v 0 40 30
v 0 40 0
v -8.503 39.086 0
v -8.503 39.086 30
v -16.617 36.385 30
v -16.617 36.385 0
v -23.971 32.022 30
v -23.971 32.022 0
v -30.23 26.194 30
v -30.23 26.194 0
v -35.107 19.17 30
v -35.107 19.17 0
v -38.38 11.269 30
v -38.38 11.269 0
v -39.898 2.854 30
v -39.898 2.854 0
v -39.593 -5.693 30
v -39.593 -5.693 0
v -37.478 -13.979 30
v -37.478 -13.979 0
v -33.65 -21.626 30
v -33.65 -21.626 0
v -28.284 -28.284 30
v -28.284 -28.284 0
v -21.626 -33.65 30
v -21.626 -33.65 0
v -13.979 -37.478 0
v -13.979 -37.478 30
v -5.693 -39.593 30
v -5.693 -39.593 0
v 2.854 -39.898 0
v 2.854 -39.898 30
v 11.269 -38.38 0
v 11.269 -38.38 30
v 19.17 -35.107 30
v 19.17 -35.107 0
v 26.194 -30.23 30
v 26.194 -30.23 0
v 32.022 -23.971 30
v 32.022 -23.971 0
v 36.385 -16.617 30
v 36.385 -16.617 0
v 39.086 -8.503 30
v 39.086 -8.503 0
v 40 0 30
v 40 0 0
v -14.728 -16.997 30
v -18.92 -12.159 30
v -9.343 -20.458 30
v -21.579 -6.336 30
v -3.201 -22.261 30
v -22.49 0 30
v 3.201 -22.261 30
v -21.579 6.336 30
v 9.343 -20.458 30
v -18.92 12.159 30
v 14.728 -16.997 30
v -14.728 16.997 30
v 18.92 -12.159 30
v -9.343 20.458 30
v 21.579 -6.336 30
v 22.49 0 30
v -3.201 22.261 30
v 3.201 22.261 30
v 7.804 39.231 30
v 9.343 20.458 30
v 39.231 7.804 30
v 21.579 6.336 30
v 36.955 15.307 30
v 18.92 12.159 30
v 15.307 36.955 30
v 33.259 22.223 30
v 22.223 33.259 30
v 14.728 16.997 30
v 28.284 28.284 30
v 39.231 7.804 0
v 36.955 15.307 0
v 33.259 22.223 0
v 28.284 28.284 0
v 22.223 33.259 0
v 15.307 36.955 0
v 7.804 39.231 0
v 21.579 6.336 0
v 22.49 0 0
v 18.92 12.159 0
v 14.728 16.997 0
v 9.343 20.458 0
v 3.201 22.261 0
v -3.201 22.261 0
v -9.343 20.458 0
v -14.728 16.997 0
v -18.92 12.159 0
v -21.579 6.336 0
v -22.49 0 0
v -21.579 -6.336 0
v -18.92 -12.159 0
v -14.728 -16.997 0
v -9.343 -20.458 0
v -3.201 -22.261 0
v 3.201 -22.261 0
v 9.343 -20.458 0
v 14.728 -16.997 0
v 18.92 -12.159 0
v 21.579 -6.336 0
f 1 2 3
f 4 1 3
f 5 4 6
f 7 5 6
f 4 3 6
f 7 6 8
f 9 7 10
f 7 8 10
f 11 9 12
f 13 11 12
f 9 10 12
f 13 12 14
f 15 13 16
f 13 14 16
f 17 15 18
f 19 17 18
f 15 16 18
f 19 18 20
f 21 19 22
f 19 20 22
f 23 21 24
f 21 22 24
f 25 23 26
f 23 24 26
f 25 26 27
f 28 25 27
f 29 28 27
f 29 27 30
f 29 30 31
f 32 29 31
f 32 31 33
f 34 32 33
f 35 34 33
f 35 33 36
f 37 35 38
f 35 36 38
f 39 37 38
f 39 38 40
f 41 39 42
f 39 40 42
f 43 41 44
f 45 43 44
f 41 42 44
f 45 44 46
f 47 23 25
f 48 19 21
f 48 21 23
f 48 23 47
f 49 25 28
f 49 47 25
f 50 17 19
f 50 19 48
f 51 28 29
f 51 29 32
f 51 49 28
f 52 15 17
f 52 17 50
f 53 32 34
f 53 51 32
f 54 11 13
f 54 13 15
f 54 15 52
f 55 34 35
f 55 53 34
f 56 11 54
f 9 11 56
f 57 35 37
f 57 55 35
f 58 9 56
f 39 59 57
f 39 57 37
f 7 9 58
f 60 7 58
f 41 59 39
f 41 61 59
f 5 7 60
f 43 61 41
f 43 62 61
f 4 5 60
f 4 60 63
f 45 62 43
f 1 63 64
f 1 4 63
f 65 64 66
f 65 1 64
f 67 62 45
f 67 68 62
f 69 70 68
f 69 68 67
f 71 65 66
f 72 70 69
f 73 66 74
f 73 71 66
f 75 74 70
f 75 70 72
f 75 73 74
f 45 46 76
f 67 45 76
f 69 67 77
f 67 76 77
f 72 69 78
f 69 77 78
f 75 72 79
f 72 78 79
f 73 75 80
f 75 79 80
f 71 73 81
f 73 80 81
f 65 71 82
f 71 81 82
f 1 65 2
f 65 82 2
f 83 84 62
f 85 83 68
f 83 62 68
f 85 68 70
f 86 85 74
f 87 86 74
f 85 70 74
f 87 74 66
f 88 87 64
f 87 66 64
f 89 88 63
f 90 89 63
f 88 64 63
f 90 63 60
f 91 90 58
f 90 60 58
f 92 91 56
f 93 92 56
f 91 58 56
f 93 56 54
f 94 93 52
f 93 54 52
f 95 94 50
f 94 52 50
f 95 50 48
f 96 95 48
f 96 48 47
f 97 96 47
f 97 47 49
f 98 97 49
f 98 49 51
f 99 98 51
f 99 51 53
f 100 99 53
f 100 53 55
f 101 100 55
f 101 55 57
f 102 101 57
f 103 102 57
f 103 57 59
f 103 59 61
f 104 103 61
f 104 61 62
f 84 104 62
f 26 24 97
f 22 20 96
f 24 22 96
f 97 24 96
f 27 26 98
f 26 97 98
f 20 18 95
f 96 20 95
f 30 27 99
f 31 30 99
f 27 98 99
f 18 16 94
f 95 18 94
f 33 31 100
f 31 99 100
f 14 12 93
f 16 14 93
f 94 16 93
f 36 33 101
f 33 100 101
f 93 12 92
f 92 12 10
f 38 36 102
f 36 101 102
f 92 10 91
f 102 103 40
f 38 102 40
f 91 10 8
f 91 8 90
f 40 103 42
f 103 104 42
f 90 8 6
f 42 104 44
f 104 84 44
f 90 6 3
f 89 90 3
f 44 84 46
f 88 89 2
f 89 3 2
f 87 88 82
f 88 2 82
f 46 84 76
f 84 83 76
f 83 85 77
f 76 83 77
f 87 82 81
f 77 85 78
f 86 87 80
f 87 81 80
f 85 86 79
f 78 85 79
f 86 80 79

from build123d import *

# Parameters (mm, degrees)
F1_DEPTH = 30
F2_R     = 22.490122
F3_DEPTH = 30.001


with BuildPart() as f1:
    # F0 (on Top) → F1 (new body)
    with BuildSketch(Plane.XY):
        with BuildLine():
            ThreePointArc((0, 40), (-28.284271, -28.284271), (40, 0))
            ThreePointArc((40, 0), (28.284271, 28.284271), (0, 40))
        make_face()
    extrude(amount=F1_DEPTH)

    # F2 (on face) → F3 (cut, through all)
    with BuildSketch(Plane.XY.offset(30)):
        Circle(F2_R)
    extrude(amount=-F3_DEPTH, mode=Mode.SUBTRACT)


with BuildPart() as f4_1:
    # F4: copy of F1
    add(f1.part)


solid = f1.part
